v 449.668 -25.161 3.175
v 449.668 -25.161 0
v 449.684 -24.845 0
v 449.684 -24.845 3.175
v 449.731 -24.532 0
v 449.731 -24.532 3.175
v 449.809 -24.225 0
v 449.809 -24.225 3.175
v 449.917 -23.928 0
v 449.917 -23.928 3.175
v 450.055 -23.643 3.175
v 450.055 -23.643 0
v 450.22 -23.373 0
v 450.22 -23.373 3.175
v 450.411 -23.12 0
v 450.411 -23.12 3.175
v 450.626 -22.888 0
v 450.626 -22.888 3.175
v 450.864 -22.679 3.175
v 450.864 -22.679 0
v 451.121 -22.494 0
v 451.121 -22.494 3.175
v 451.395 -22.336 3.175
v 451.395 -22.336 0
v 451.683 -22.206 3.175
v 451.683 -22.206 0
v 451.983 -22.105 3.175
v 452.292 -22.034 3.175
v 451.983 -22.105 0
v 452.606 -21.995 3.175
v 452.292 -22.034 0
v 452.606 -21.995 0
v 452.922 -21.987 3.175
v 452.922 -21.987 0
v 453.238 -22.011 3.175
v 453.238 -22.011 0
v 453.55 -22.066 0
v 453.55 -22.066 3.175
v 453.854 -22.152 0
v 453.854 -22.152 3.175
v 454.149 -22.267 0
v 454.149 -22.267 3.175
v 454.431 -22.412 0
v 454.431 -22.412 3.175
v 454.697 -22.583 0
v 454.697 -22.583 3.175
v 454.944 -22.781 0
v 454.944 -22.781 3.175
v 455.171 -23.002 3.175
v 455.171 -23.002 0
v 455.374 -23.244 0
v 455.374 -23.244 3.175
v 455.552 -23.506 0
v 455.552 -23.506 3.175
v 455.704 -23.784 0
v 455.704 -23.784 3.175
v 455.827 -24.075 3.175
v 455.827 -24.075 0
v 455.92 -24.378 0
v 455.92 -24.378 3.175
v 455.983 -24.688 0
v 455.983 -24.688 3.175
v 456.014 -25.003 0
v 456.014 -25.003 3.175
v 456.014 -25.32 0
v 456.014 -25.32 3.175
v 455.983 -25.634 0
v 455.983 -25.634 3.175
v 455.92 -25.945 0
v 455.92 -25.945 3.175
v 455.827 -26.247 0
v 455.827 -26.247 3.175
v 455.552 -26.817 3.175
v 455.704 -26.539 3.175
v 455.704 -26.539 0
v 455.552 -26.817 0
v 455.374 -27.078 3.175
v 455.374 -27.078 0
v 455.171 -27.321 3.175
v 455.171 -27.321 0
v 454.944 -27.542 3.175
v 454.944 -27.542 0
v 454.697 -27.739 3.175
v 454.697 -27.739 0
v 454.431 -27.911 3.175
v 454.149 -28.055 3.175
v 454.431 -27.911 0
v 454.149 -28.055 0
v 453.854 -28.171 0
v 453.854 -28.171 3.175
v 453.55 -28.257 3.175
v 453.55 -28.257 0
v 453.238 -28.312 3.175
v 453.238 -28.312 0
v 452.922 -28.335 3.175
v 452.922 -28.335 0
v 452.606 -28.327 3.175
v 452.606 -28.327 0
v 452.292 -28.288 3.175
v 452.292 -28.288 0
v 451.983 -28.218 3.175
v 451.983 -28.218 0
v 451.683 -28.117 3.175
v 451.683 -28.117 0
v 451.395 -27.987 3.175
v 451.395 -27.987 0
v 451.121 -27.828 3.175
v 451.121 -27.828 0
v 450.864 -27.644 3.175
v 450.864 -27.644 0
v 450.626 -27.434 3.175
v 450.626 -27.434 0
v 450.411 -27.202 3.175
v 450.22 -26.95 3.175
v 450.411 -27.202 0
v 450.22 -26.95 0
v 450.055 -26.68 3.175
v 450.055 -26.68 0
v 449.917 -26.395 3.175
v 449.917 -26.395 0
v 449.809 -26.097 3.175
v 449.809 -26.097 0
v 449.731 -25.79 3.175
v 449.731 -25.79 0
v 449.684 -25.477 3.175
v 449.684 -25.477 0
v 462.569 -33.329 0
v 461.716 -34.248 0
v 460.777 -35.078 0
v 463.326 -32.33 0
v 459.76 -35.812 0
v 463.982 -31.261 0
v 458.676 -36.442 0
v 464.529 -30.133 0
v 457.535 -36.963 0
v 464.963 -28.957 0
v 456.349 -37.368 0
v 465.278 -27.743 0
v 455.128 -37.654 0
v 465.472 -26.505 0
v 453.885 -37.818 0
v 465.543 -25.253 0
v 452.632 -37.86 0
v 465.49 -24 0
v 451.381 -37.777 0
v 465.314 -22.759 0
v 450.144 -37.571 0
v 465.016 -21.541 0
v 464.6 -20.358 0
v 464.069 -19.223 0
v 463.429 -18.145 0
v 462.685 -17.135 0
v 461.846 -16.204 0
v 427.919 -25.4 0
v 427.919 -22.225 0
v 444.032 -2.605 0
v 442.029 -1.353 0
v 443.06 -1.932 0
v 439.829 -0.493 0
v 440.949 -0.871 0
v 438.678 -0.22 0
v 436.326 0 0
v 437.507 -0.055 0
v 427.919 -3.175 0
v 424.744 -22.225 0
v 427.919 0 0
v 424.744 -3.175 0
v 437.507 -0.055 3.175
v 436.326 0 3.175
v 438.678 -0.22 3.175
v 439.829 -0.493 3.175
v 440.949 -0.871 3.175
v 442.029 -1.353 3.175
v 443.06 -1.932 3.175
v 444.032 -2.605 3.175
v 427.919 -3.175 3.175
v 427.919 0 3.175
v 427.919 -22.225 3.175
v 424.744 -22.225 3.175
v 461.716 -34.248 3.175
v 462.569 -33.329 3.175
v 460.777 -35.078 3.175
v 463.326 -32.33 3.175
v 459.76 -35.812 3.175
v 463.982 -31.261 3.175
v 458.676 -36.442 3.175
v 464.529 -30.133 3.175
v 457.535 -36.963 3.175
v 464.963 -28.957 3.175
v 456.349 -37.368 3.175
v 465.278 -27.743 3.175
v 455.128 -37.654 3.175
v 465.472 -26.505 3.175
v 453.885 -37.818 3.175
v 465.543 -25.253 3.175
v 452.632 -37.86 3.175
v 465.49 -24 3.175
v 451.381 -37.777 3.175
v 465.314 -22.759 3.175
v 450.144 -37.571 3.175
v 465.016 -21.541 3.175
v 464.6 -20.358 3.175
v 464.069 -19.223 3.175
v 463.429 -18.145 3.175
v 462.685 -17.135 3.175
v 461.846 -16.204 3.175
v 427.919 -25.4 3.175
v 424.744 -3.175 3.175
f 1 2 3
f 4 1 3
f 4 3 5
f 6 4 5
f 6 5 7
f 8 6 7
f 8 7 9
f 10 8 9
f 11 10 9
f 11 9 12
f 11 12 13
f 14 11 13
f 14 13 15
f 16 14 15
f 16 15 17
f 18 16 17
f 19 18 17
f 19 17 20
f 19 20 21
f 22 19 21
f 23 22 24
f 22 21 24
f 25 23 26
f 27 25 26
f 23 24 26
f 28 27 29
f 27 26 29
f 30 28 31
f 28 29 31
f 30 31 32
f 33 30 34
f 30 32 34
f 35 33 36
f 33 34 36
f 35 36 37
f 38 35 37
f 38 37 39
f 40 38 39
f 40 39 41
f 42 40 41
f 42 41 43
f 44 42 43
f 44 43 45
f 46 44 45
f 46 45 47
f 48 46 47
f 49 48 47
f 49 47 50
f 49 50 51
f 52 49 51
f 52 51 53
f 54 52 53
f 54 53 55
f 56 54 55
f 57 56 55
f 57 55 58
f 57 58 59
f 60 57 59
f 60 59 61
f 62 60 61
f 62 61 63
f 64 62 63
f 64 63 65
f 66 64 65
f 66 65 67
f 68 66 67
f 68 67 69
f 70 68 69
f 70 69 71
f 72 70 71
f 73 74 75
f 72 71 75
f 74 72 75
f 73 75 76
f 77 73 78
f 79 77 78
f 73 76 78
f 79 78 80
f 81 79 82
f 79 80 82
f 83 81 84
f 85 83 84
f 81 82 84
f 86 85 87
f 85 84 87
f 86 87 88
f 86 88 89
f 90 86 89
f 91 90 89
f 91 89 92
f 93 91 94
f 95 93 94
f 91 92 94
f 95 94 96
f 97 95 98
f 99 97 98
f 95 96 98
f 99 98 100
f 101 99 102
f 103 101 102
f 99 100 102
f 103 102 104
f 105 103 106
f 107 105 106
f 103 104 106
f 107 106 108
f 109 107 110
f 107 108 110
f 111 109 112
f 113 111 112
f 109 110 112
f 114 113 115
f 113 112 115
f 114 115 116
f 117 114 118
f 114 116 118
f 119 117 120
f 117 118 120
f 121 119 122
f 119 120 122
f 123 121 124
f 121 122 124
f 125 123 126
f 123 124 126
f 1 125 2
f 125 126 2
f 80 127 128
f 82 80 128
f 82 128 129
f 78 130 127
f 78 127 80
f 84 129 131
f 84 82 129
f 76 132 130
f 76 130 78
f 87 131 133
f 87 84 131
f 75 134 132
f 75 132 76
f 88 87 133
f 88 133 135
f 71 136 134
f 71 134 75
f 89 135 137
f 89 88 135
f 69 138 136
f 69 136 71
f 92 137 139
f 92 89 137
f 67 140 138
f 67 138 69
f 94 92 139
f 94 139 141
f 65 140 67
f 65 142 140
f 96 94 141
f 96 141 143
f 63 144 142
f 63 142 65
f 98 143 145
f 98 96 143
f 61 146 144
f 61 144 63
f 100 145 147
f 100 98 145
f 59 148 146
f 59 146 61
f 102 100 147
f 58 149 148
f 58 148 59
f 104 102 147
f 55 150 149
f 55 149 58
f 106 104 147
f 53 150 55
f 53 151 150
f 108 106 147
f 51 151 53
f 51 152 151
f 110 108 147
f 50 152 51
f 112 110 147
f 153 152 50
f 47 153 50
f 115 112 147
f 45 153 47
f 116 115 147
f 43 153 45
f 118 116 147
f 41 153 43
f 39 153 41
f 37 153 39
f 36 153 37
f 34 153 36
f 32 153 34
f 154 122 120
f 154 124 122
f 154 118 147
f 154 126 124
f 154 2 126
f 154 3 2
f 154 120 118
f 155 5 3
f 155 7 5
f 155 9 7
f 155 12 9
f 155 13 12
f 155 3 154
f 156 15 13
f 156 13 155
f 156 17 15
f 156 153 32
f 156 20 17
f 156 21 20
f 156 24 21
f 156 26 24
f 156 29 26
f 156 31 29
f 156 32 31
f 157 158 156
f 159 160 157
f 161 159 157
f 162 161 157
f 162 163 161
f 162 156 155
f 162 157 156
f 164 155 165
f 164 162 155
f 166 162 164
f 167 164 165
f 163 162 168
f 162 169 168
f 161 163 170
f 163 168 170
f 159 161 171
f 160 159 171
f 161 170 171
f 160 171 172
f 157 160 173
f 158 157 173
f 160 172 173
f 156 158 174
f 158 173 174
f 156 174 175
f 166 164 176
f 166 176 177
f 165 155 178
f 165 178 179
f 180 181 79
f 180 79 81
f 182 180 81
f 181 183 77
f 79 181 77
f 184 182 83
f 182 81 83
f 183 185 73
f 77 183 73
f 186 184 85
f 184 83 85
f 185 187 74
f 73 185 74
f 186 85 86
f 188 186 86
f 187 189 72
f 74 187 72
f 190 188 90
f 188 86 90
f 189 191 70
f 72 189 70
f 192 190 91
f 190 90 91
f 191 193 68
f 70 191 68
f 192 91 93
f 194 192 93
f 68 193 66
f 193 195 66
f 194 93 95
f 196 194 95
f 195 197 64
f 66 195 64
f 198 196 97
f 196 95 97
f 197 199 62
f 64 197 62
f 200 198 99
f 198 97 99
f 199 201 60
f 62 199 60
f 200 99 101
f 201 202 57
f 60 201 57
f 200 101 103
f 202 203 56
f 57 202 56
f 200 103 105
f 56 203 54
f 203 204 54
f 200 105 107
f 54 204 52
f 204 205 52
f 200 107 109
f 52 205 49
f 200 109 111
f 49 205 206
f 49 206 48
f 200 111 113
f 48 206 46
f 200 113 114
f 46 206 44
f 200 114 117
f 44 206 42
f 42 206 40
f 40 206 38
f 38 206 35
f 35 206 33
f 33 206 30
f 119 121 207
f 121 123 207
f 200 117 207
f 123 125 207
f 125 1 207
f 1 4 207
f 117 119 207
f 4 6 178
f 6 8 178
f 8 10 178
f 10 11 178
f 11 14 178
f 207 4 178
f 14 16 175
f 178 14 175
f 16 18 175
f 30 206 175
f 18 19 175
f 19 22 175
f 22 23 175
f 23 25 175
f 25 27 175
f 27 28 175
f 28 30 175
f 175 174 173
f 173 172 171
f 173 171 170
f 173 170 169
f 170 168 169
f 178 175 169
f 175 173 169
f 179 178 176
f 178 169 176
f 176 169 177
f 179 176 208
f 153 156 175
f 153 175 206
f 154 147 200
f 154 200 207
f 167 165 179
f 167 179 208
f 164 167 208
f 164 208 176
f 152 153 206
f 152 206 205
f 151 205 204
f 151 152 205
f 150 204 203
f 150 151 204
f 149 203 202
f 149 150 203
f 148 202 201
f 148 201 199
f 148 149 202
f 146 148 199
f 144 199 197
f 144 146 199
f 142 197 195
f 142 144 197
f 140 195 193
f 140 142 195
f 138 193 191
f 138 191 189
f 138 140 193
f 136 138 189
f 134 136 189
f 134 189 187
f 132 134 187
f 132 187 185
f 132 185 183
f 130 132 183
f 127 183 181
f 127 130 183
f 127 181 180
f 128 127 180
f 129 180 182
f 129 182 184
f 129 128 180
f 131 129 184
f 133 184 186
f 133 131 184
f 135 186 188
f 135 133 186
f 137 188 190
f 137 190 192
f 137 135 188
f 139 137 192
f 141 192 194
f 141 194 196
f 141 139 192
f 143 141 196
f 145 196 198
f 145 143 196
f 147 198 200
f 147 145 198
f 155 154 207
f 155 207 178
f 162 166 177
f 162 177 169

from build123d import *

# Parameters (mm, degrees)
BOSS_EXTRUDE1_DEPTH             = 3.175
F_1_4_0_25_DIAMETER_HOLE1_D     = 6.35
F_1_4_0_25_DIAMETER_HOLE1_DEPTH = 9.268267535
F_1_4_0_25_DIAMETER_HOLE1_TIP   = 1.907732465
FILLET1_R                       = 12.7


with BuildPart() as part:
    # Sketch1 → Boss-Extrude1 (new body)
    with BuildSketch(Plane.XY):
        with BuildLine():
            Line((427.919423357, 0), (440.619423357, 0))
            Line((440.619423357, 0), (461.846041333, -16.2036647))
            ThreePointArc((461.846041333, -16.2036647), (463.98221908, -31.261387982), (450.144423357, -37.571197432))
            Line((450.144423357, -37.571197432), (427.919423357, -25.4))
            Line((427.919423357, -25.4), (427.919423357, -22.225))
            Line((427.919423357, -22.225), (424.744423357, -22.225))
            Line((424.744423357, -22.225), (424.744423357, -3.175))
            Line((424.744423357, -3.175), (427.919423357, -3.175))
            Line((427.919423357, -3.175), (427.919423357, 0))
        make_face()
    extrude(amount=BOSS_EXTRUDE1_DEPTH)

    # 1/4 (0.25) Diameter Hole1
    with Locations(Plane.XY.offset(3.175)):
        with Locations((452.843173357, -25.161251887)):
            Hole(F_1_4_0_25_DIAMETER_HOLE1_D / 2, depth=F_1_4_0_25_DIAMETER_HOLE1_DEPTH)
            with Locations((0, 0, -(F_1_4_0_25_DIAMETER_HOLE1_DEPTH + F_1_4_0_25_DIAMETER_HOLE1_TIP / 2))):  # 118° drill point
                Cone(0, F_1_4_0_25_DIAMETER_HOLE1_D / 2, F_1_4_0_25_DIAMETER_HOLE1_TIP, mode=Mode.SUBTRACT)

    # Fillet1
    fillet1_edges = [part.edges().sort_by_distance(p)[0] for p in [
        (440.619423357, 0, 1.5875),
    ]]
    fillet(fillet1_edges, radius=FILLET1_R)


solid = part.part
